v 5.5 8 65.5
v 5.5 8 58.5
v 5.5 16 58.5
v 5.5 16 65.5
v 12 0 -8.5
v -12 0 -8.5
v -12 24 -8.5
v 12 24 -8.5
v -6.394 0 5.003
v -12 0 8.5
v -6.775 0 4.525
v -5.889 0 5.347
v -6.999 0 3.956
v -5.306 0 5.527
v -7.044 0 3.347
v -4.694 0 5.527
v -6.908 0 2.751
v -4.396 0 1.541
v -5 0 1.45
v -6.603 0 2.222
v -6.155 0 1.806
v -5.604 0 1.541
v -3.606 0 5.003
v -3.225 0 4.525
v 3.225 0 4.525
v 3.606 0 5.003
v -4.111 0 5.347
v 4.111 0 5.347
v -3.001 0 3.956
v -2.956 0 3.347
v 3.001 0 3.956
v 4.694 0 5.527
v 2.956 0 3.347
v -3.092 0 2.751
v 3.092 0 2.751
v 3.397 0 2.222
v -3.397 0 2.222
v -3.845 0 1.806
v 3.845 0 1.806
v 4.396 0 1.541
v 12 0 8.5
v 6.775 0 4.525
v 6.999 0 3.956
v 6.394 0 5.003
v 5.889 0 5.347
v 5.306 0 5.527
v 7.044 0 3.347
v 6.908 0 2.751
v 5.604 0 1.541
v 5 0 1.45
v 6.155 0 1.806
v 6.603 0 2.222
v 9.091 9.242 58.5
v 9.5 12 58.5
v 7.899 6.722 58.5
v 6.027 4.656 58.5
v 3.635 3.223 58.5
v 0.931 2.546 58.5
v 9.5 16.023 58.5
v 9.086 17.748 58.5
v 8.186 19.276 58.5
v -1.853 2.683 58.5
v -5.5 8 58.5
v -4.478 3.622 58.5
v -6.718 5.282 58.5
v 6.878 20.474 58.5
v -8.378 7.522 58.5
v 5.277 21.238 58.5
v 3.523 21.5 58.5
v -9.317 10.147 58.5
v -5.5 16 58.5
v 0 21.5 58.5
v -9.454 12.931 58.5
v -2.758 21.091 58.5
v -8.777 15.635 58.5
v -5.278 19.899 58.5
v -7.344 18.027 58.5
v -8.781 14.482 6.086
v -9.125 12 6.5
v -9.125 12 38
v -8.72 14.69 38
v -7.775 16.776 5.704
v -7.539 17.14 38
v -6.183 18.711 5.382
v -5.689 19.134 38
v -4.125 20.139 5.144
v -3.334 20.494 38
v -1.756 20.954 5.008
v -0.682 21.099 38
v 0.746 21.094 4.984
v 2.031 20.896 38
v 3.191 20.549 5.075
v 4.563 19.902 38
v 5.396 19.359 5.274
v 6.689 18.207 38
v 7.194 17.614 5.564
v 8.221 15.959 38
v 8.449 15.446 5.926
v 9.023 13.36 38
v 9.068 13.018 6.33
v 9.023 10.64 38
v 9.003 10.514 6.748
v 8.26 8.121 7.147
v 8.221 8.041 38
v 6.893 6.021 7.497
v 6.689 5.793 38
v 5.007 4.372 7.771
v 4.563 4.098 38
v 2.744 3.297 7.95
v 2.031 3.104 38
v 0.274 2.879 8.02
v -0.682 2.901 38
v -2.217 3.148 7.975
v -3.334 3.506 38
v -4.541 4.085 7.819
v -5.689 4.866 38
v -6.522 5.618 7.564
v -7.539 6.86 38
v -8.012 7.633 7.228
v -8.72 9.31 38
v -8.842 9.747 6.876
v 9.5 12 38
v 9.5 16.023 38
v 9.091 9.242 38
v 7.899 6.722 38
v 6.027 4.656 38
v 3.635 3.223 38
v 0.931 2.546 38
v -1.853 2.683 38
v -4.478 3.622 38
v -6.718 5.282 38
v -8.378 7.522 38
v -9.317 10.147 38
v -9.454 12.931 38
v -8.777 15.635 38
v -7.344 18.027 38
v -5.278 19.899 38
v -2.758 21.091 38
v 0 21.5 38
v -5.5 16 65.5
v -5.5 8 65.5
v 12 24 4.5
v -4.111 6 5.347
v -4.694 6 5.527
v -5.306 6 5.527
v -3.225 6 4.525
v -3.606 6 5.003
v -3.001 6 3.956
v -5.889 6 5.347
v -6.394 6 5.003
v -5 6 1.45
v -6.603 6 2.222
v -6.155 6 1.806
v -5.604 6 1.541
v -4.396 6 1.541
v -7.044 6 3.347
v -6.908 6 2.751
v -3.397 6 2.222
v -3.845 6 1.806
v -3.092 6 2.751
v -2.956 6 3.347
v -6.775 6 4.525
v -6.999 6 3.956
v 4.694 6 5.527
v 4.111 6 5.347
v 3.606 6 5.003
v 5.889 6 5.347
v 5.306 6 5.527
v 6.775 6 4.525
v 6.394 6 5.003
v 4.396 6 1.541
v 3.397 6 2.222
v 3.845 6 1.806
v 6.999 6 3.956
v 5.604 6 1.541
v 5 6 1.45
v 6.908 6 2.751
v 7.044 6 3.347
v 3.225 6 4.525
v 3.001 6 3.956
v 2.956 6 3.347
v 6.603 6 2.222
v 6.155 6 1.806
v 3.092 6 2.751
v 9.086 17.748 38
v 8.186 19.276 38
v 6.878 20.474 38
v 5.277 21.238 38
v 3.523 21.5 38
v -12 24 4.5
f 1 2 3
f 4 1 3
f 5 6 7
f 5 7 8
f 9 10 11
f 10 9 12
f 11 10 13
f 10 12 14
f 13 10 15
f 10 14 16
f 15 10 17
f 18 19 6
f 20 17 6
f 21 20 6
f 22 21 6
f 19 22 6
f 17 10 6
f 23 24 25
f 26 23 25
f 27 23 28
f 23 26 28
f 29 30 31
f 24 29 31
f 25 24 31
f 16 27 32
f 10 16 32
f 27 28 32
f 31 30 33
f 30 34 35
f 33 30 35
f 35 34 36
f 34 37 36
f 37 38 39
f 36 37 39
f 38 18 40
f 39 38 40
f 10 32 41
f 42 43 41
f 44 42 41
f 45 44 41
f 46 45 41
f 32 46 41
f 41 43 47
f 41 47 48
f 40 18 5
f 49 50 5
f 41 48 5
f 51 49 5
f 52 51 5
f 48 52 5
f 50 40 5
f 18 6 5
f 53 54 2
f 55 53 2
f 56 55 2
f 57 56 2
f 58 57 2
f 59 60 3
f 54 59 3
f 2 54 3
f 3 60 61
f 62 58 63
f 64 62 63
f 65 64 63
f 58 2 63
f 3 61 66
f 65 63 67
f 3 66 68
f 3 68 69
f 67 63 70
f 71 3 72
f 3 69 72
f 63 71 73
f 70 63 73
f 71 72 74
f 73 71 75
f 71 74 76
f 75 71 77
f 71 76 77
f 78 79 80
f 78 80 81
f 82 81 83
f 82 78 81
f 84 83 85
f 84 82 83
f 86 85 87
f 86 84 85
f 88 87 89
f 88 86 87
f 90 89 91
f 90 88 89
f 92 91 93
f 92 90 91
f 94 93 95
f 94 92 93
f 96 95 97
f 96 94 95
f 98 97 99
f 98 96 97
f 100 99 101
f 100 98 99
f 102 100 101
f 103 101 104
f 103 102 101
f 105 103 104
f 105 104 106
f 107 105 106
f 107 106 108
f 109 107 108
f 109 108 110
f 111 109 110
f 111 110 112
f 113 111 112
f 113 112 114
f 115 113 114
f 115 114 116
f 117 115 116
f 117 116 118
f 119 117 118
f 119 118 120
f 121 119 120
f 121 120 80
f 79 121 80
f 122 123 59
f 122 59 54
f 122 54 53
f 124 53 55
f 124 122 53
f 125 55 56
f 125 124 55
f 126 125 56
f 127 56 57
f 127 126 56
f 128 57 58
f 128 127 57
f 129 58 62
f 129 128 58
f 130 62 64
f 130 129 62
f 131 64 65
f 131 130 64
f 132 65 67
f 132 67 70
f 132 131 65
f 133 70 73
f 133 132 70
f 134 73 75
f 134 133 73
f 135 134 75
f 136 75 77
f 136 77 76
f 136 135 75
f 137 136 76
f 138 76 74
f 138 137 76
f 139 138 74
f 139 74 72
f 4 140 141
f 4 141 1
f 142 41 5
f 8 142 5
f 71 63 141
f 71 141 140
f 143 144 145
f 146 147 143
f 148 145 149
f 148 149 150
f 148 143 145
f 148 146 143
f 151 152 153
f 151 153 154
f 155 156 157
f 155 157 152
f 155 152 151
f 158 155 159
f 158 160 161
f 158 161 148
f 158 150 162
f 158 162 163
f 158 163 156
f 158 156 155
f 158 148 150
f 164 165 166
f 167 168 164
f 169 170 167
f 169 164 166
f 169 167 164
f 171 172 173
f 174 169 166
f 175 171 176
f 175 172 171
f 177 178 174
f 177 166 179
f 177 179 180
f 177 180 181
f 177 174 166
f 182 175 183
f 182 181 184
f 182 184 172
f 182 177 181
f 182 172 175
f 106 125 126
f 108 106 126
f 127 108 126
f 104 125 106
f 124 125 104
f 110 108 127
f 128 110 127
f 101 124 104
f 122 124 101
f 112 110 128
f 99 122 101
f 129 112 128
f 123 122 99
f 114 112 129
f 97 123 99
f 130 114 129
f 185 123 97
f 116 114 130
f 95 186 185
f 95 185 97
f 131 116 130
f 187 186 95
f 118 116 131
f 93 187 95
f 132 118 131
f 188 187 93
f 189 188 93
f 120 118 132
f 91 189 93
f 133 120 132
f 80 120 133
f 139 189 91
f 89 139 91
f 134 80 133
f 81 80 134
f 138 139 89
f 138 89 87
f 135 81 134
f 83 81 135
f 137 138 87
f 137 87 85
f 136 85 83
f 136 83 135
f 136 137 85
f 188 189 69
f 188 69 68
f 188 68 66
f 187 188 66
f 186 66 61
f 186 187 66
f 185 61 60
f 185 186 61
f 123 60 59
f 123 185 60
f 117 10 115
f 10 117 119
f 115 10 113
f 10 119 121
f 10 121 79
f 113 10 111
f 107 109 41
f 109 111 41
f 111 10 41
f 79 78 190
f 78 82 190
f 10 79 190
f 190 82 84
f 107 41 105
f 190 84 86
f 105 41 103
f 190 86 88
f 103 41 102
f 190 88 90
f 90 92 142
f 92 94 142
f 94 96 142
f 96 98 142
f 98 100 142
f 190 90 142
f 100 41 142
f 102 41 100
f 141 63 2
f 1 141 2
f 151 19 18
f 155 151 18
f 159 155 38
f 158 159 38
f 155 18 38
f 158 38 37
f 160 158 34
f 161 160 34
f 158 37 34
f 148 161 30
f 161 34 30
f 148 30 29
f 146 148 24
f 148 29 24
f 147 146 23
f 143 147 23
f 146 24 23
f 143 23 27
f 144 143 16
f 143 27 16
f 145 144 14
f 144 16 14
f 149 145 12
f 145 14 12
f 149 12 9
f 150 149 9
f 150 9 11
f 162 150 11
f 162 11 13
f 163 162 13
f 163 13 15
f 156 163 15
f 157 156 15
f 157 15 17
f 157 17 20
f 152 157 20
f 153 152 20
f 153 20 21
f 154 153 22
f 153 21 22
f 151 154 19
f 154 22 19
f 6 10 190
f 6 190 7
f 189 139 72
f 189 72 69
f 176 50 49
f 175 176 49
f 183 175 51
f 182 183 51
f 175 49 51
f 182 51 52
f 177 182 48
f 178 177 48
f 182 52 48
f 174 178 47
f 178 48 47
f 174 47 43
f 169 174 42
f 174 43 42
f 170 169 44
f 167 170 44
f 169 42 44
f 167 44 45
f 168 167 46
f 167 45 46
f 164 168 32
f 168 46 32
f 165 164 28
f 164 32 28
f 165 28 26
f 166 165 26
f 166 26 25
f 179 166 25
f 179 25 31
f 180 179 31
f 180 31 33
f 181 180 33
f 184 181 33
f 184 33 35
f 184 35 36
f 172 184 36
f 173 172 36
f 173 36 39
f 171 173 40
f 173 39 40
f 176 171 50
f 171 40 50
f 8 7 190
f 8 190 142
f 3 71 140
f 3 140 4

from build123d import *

# Parameters (mm, degrees)
CROQUIS1_W              = 24
CROQUIS1_H              = 17
SALIENTE_EXTRUIR1_DEPTH = 24
CORTAR_EXTRUIR1_DEPTH   = 24
CROQUIS4_R              = 9.125
SALIENTE_EXTRUIR3_DEPTH = 33.5
SALIENTE_EXTRUIR4_DEPTH = 20.5
CROQUIS6_W              = 11
CROQUIS6_H              = 8
SALIENTE_EXTRUIR5_DEPTH = 7
CROQUIS7_R              = 2.05
CORTAR_EXTRUIR2_DEPTH   = 6


with BuildPart() as part:
    # Croquis1 → Saliente-Extruir1 (new body)
    with BuildSketch(Plane(origin=(0, 0, 0), x_dir=(1, 0, 0), z_dir=(0, 1, 0))):
        Rectangle(CROQUIS1_W, CROQUIS1_H)
    extrude(amount=SALIENTE_EXTRUIR1_DEPTH)

    # Croquis2 → Cortar-Extruir1 (cut)
    with BuildSketch(Plane(origin=(12, 0, 0), x_dir=(0, 0, -1), z_dir=(1, 0, 0))):
        Polygon((-8.5, 0), (-4.500138715, 24), (-8.5, 24), align=None)
    extrude(amount=-CORTAR_EXTRUIR1_DEPTH, mode=Mode.SUBTRACT)

    # Croquis4 → Saliente-Extruir3 (add)
    with BuildSketch(Plane(origin=(0, 0, 4.500138715), x_dir=(1, 0, 0), z_dir=(0, 0, -1))):
        with Locations(Location((0, -12, 0), (0, 0, 180))):
            Circle(CROQUIS4_R)
    extrude(amount=-SALIENTE_EXTRUIR3_DEPTH)

    # Croquis5 → Saliente-Extruir4 (add)
    with BuildSketch(Plane.XY.offset(38.000138715)):
        with BuildLine():
            Line((0, 21.5), (3.522837546, 21.5))
            ThreePointArc((3.522837546, 21.5), (7.576354538, 19.923686246), (9.5, 16.023))
            Line((9.5, 16.023), (9.5, 12))
            ThreePointArc((9.5, 12), (-6.717514421, 5.282485579), (0, 21.5))
        make_face()
    extrude(amount=SALIENTE_EXTRUIR4_DEPTH)

    # Croquis6 → Saliente-Extruir5 (add)
    with BuildSketch(Plane.XY.offset(58.500138715)):
        with Locations((0, 12)):
            Rectangle(CROQUIS6_W, CROQUIS6_H)
    extrude(amount=SALIENTE_EXTRUIR5_DEPTH)

    # Croquis7 → Cortar-Extruir2 (cut)
    with BuildSketch(Plane.XZ):
        with Locations(Location((-5, 3.5, 0), (0, 0, 270))):
            Circle(CROQUIS7_R)
        with Locations(Location((5, 3.5, 0), (0, 0, 270))):
            Circle(CROQUIS7_R)
    extrude(amount=-CORTAR_EXTRUIR2_DEPTH, mode=Mode.SUBTRACT)


solid = part.part
